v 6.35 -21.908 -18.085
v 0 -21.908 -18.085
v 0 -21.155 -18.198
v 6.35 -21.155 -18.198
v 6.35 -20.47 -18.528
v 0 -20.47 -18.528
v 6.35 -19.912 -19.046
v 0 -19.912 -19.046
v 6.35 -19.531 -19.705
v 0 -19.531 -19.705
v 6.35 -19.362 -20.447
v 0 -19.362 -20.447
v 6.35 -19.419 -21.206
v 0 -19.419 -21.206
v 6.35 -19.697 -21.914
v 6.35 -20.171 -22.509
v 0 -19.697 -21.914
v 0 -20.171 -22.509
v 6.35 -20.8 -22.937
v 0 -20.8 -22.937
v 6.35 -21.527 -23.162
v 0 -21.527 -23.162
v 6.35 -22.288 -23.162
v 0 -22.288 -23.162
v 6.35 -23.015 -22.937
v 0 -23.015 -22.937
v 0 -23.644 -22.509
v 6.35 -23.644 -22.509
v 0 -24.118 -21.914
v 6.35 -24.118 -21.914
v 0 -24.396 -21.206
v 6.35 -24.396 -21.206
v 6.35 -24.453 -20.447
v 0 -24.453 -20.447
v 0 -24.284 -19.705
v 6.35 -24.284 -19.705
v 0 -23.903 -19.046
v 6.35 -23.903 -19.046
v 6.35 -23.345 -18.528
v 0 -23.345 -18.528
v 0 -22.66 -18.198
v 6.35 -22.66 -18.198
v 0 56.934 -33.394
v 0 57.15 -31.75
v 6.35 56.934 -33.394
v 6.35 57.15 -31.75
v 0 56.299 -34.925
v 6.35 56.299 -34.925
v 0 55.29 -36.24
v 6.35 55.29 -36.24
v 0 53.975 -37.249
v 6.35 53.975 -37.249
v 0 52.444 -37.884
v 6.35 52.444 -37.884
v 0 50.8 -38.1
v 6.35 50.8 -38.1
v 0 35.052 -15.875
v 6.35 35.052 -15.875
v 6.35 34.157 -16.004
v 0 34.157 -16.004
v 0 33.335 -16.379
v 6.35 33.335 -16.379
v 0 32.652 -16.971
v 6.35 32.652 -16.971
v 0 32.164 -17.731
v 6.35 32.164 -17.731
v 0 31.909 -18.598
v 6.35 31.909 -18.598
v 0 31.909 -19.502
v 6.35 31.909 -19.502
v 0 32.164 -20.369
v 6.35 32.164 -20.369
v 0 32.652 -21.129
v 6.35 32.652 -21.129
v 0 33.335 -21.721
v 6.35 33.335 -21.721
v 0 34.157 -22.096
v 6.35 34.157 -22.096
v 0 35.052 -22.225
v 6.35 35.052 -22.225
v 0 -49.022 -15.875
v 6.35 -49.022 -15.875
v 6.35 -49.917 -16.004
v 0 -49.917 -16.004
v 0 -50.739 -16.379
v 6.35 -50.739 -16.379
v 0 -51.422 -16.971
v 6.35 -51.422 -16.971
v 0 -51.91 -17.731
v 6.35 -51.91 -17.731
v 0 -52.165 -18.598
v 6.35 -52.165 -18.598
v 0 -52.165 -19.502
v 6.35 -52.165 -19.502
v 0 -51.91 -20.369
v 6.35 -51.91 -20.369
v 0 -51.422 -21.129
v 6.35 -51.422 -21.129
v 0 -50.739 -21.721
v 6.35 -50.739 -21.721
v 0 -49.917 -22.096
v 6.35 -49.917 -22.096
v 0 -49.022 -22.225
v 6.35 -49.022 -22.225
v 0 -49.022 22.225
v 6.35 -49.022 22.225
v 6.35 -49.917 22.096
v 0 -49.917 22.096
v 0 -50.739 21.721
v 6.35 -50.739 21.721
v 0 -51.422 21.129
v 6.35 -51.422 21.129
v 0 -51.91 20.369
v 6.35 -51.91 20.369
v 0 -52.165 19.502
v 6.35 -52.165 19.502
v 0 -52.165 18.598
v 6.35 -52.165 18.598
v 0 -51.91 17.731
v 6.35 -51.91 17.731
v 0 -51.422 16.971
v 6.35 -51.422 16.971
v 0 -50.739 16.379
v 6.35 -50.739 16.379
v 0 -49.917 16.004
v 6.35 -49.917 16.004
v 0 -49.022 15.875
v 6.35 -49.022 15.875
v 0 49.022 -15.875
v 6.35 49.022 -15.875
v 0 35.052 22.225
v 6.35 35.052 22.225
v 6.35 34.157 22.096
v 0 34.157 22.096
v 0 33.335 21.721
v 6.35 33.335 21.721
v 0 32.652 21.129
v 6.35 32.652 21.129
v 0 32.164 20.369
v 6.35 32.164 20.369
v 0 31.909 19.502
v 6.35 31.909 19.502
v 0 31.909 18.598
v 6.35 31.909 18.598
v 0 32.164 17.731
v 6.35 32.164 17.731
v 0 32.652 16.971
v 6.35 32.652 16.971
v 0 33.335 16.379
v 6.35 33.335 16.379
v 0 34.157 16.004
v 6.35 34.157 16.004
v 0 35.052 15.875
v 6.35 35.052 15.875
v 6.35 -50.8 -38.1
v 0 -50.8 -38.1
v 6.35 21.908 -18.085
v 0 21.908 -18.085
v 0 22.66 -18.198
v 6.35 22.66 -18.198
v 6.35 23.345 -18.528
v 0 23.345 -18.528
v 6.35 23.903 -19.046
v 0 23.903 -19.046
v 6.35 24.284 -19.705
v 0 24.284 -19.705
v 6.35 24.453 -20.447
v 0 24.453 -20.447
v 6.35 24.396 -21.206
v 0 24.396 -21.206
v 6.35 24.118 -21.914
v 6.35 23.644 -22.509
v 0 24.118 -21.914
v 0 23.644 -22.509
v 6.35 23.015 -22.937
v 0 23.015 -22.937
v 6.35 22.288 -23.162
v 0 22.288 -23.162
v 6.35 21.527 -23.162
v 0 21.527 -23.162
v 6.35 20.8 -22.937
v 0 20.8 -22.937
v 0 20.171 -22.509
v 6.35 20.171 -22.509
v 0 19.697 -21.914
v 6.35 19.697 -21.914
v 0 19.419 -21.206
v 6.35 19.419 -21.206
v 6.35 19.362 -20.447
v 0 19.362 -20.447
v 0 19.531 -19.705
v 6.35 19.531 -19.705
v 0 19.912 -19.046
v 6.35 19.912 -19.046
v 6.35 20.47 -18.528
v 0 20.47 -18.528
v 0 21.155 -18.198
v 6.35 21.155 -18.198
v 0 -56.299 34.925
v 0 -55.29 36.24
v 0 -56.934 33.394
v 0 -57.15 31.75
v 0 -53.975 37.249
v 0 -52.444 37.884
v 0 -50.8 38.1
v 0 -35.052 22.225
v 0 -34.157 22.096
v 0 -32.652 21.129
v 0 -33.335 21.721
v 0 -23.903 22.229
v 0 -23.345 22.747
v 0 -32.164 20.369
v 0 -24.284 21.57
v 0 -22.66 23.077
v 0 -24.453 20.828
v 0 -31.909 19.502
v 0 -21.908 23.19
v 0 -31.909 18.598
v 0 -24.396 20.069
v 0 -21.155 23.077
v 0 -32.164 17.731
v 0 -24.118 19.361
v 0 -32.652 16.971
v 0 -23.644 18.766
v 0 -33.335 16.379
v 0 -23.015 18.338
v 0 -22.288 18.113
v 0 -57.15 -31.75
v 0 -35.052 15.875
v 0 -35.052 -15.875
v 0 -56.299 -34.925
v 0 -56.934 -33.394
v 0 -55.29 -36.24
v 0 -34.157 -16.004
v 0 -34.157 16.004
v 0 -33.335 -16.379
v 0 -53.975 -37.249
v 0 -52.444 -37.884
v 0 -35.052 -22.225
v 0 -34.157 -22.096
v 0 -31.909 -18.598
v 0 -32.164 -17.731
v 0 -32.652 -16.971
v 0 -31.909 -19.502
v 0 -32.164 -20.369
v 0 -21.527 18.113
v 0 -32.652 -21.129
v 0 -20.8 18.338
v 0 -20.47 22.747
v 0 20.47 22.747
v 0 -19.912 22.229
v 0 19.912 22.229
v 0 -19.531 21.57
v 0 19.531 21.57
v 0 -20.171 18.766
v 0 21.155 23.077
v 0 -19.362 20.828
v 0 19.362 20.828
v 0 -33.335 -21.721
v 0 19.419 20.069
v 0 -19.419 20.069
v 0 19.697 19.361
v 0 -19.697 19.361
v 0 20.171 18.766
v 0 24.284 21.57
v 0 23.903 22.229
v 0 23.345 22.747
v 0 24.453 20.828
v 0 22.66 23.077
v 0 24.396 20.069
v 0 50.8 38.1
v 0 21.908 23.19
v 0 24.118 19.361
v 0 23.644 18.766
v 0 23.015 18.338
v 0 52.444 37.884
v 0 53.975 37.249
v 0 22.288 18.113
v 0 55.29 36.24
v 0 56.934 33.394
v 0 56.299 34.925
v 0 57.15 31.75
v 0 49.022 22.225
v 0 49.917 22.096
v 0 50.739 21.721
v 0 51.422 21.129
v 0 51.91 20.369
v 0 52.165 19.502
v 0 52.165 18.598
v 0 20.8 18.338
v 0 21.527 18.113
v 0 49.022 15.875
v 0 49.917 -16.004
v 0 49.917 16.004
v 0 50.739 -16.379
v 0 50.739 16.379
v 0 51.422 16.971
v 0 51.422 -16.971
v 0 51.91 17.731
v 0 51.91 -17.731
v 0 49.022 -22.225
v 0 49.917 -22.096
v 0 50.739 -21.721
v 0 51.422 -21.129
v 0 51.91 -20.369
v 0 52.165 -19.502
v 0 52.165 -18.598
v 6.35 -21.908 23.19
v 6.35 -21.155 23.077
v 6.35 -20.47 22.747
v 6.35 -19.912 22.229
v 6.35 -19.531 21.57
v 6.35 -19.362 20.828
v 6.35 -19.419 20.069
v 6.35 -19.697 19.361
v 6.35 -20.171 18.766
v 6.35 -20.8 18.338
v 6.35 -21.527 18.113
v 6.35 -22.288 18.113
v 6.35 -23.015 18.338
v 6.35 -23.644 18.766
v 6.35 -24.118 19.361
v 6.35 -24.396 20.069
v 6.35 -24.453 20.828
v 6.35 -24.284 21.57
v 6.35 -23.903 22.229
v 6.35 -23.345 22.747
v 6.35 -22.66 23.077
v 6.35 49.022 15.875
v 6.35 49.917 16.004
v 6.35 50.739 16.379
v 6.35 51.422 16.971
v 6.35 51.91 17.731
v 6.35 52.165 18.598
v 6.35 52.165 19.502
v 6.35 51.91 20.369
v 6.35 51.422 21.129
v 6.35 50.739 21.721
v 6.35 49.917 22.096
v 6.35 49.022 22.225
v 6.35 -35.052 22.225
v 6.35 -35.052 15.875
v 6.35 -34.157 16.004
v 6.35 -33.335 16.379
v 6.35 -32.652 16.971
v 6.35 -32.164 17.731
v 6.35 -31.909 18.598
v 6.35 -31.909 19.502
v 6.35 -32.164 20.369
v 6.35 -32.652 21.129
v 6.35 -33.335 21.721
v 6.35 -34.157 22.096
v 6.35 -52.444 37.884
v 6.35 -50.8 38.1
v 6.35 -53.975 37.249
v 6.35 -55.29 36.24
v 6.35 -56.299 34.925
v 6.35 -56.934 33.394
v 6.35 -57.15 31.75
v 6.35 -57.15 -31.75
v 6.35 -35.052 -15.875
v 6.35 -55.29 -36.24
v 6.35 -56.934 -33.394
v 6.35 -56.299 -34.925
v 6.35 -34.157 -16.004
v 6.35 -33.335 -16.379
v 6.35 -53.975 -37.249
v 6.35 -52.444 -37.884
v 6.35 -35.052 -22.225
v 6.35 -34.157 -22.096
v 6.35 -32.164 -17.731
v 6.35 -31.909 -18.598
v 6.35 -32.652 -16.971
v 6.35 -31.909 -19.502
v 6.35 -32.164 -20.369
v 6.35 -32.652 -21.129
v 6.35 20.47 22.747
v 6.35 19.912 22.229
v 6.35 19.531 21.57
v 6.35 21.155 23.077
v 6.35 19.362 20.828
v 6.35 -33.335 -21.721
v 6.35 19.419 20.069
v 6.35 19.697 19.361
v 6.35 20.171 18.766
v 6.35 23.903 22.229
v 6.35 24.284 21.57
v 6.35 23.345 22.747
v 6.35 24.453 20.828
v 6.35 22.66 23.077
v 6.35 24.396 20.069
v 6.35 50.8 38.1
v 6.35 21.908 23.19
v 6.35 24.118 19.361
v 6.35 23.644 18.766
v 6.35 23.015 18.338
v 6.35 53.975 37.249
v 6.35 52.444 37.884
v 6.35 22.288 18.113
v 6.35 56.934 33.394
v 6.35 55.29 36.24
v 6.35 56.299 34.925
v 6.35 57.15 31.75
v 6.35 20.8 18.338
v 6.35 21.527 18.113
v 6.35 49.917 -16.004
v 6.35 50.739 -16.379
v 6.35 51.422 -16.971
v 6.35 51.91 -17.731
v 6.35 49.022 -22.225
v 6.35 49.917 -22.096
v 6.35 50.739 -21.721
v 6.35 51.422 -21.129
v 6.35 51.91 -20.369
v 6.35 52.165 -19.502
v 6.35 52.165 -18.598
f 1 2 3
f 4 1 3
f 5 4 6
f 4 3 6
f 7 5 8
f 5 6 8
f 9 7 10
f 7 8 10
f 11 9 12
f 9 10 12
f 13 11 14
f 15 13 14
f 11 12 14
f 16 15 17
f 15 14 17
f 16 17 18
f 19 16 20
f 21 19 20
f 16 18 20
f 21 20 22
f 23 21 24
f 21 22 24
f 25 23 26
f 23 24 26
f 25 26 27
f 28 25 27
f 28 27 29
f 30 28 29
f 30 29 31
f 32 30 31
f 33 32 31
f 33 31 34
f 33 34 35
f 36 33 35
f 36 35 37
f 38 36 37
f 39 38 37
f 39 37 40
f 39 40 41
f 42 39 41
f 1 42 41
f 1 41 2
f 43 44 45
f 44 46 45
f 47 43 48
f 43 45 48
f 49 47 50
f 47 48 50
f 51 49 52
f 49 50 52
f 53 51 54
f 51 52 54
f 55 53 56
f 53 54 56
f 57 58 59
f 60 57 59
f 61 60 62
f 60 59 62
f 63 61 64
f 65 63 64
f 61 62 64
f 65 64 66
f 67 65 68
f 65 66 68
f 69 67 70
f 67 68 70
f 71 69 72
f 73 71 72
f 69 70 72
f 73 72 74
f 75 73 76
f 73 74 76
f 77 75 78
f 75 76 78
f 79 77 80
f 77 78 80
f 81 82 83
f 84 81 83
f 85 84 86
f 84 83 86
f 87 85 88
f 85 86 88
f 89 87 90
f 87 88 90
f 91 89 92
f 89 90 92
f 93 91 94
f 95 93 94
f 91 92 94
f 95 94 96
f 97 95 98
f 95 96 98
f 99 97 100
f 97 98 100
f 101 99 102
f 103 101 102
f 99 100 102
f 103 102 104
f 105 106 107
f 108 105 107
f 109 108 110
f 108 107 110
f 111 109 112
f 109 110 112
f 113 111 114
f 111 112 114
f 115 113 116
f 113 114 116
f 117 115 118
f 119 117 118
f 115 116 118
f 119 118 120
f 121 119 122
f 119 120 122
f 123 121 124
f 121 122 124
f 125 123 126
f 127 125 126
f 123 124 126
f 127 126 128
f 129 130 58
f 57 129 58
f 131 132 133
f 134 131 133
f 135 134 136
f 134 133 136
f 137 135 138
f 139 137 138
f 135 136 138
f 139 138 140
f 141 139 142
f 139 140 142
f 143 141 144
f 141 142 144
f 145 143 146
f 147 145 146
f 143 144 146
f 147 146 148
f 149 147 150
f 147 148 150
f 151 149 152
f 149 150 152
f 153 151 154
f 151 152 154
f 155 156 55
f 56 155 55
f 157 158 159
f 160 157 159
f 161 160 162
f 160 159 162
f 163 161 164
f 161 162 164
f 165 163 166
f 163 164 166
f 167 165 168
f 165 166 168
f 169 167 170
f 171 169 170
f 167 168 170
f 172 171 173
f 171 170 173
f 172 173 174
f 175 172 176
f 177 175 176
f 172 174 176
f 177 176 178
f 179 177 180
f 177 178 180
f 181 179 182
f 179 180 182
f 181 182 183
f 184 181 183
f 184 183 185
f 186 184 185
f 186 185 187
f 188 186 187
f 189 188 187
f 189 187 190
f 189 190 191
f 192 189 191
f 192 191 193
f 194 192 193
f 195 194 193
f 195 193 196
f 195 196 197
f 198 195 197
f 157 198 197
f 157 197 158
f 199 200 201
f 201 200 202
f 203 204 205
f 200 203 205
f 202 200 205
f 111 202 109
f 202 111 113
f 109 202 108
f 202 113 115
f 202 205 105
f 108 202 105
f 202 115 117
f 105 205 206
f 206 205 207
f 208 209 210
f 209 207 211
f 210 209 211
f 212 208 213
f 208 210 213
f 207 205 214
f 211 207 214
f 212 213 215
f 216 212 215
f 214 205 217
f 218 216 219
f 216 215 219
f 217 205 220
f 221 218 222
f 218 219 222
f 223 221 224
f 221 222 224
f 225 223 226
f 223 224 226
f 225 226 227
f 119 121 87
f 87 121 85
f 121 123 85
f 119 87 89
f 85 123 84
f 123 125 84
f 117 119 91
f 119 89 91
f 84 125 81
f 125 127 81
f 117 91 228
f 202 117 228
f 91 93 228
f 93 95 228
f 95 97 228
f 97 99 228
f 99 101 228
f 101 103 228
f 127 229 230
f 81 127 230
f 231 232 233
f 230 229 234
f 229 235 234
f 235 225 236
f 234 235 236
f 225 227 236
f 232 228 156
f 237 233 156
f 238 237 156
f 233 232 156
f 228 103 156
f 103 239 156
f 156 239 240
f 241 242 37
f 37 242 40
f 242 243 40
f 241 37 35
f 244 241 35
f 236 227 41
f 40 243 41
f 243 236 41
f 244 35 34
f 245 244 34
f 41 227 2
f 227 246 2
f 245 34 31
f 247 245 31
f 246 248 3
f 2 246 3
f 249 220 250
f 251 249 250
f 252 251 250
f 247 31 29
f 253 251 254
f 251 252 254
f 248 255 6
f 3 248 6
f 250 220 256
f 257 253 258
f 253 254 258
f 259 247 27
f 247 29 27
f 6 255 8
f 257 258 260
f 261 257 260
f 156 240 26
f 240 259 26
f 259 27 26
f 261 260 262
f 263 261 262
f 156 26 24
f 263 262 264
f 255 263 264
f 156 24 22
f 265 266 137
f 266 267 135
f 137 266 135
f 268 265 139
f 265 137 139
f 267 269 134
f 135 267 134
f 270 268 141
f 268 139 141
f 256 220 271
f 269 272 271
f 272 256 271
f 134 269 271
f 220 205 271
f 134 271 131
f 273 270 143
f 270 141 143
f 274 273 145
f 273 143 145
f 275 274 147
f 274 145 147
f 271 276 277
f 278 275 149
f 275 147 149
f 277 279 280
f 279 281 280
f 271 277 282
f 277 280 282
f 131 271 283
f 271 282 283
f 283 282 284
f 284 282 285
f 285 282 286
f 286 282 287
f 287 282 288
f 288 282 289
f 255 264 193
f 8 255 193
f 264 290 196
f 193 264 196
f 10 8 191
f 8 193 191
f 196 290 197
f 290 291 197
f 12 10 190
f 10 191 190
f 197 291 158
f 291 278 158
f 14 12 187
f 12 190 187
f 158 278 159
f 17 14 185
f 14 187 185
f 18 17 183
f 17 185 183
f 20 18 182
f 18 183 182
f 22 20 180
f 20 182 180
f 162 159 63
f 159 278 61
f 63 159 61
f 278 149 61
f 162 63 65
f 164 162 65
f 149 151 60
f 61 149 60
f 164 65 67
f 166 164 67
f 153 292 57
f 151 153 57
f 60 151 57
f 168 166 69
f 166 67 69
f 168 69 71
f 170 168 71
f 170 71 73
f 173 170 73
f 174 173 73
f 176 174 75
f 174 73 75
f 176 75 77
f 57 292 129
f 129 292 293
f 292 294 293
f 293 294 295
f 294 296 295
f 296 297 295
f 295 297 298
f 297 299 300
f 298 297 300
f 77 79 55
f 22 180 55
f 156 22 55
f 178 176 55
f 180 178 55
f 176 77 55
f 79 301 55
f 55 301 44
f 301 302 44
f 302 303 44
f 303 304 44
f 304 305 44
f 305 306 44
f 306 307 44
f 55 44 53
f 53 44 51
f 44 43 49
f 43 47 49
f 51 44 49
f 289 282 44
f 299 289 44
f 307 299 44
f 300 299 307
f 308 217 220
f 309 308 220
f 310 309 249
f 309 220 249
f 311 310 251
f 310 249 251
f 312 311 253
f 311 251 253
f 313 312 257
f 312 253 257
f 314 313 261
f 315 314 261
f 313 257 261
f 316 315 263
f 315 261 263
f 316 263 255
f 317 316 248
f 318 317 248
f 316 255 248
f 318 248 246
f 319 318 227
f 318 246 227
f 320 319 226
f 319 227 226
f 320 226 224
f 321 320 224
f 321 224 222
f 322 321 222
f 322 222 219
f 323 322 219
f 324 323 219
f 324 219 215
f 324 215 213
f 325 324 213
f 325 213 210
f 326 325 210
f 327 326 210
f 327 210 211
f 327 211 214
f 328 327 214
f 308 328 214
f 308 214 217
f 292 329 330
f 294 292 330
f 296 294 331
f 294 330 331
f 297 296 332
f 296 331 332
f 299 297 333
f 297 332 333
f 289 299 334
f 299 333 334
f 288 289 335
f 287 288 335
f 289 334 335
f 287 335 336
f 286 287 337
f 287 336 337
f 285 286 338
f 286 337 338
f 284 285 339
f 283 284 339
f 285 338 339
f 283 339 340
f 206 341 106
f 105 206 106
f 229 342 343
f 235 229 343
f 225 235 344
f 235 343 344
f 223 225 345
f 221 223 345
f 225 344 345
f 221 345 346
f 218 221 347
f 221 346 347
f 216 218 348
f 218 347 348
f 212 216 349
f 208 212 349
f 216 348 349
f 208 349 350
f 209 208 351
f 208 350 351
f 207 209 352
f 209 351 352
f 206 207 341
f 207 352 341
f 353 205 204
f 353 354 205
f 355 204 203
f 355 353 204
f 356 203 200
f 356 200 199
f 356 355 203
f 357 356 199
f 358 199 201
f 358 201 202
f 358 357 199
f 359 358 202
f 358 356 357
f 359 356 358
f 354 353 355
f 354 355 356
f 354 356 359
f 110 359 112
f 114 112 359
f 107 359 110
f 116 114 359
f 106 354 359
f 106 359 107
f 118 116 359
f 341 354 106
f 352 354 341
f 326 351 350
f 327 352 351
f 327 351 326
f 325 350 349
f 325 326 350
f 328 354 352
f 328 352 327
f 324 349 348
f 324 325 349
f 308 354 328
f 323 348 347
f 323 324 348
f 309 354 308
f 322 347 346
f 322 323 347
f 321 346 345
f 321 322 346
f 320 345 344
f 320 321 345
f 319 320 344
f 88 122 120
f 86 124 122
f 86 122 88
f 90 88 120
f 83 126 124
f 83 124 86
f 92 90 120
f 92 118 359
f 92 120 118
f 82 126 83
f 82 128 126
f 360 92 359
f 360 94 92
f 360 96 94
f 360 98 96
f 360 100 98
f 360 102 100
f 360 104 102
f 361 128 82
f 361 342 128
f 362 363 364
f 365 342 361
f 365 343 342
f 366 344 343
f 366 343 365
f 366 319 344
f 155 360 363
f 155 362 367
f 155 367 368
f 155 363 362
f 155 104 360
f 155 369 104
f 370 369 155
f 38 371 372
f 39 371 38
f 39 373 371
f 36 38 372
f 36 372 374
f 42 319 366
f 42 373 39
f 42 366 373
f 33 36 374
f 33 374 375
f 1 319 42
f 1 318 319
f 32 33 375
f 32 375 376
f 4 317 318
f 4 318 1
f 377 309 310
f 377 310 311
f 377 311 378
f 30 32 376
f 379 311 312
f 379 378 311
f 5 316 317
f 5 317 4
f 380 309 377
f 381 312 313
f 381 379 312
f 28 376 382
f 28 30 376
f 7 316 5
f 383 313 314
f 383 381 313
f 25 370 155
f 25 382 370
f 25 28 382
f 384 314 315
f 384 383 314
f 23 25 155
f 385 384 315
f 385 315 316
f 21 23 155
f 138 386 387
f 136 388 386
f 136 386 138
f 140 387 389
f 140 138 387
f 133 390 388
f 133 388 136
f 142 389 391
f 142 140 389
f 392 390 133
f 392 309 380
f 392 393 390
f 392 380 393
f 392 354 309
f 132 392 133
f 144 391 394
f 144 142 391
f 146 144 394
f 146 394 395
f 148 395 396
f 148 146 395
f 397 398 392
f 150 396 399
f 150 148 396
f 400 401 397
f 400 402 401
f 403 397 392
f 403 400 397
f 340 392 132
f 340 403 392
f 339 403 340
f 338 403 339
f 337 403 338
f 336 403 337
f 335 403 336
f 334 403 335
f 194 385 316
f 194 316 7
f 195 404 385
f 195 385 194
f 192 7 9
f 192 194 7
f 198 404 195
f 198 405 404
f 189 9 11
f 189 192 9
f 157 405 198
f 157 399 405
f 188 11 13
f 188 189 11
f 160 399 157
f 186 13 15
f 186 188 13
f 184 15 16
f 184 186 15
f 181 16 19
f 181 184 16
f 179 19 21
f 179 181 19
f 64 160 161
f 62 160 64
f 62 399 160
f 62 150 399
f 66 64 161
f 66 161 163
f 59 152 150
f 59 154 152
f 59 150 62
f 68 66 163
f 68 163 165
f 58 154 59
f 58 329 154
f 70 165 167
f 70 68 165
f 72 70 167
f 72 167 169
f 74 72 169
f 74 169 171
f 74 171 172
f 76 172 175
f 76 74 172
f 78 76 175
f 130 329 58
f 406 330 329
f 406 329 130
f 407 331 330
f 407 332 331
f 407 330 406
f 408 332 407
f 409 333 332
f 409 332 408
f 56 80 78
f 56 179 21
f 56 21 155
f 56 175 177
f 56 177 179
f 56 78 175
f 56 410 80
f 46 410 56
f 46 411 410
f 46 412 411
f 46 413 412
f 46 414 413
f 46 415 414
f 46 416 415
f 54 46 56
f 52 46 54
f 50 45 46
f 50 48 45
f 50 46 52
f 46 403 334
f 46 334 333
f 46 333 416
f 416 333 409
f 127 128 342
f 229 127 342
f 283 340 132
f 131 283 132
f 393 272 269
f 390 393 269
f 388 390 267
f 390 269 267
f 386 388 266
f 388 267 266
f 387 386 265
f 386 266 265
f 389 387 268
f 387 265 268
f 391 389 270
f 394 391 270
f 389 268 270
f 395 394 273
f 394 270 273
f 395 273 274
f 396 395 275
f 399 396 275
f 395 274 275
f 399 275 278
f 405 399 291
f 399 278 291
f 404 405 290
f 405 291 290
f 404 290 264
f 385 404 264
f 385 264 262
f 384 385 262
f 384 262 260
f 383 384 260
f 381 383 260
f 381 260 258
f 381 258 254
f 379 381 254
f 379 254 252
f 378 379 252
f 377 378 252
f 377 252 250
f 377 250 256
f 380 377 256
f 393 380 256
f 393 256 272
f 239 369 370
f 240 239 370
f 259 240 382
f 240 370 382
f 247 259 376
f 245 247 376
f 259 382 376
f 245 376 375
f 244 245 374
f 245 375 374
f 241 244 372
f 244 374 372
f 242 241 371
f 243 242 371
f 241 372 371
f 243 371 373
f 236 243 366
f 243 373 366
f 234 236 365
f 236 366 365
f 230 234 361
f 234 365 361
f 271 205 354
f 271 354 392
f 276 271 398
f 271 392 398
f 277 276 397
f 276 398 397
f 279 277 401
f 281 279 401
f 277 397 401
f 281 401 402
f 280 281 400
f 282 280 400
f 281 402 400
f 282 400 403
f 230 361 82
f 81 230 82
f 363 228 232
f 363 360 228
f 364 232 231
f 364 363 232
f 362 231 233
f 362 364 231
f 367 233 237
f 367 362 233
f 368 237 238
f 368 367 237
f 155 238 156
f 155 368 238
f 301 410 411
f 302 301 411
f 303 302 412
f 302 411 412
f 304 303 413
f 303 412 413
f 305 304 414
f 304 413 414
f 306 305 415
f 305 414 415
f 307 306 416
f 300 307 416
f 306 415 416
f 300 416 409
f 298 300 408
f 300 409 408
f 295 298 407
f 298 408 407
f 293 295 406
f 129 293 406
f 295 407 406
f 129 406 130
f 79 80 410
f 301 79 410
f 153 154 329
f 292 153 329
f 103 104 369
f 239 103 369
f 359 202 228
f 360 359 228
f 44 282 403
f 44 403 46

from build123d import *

# Parameters (mm, degrees)
SKETCH1_W               = 76.2
SKETCH1_H               = 114.3
BOSS_EXTRUDE1_DEPTH     = 6.35
F_1_4_20_TAPPED_HOLE1_D = 5.1054
CUT_EXTRUDE1_DEPTH      = 69.978656119
FILLET1_R               = 6.35


with BuildPart() as part:
    # Sketch1 → Boss-Extrude1 (new body)
    with BuildSketch(Plane(origin=(0, 0, 0), x_dir=(0, 0, -1), z_dir=(1, 0, 0))):
        Rectangle(SKETCH1_W, SKETCH1_H)
    extrude(amount=BOSS_EXTRUDE1_DEPTH)

    # 1/4-20 Tapped Hole1 (through all)
    with Locations(Plane(origin=(6.35, 0, 0), x_dir=(0, 0, -1), z_dir=(1, 0, 0))):
        with Locations((-20.6375, 21.9075), (20.6375, 21.9075), (20.6375, -21.9075), (-20.6375, -21.9075)):
            Hole(F_1_4_20_TAPPED_HOLE1_D / 2)

    # Sketch4 → Cut-Extrude1 (cut, through all)
    with BuildSketch(Plane(origin=(6.35, 0, 0), x_dir=(0, 0, -1), z_dir=(1, 0, 0))):
        with BuildLine():
            Line((15.875, 49.022), (15.875, 35.052))
            ThreePointArc((15.875, 35.052), (19.05, 31.877), (22.225, 35.052))
            Line((22.225, 35.052), (22.225, 49.022))
            ThreePointArc((22.225, 49.022), (19.05, 52.197), (15.875, 49.022))
        make_face()
        with BuildLine():
            Line((-22.225, 49.022), (-22.225, 35.052))
            ThreePointArc((-22.225, 35.052), (-19.05, 31.877), (-15.875, 35.052))
            Line((-15.875, 35.052), (-15.875, 49.022))
            ThreePointArc((-15.875, 49.022), (-19.05, 52.197), (-22.225, 49.022))
        make_face()
        with BuildLine():
            Line((-15.875, -49.022), (-15.875, -35.052))
            ThreePointArc((-15.875, -35.052), (-19.05, -31.877), (-22.225, -35.052))
            Line((-22.225, -35.052), (-22.225, -49.022))
            ThreePointArc((-22.225, -49.022), (-19.05, -52.197), (-15.875, -49.022))
        make_face()
        with BuildLine():
            Line((22.225, -49.022), (22.225, -35.052))
            ThreePointArc((22.225, -35.052), (19.05, -31.877), (15.875, -35.052))
            Line((15.875, -35.052), (15.875, -49.022))
            ThreePointArc((15.875, -49.022), (19.05, -52.197), (22.225, -49.022))
        make_face()
    extrude(amount=-CUT_EXTRUDE1_DEPTH, mode=Mode.SUBTRACT)

    # Fillet1
    fillet1_edges = [part.edges().sort_by_distance(p)[0] for p in [
        (3.175, -57.15, -38.1),
        (3.175, -57.15, 38.1),
        (3.175, 57.15, 38.1),
        (3.175, 57.15, -38.1),
    ]]
    fillet(fillet1_edges, radius=FILLET1_R)


solid = part.part
